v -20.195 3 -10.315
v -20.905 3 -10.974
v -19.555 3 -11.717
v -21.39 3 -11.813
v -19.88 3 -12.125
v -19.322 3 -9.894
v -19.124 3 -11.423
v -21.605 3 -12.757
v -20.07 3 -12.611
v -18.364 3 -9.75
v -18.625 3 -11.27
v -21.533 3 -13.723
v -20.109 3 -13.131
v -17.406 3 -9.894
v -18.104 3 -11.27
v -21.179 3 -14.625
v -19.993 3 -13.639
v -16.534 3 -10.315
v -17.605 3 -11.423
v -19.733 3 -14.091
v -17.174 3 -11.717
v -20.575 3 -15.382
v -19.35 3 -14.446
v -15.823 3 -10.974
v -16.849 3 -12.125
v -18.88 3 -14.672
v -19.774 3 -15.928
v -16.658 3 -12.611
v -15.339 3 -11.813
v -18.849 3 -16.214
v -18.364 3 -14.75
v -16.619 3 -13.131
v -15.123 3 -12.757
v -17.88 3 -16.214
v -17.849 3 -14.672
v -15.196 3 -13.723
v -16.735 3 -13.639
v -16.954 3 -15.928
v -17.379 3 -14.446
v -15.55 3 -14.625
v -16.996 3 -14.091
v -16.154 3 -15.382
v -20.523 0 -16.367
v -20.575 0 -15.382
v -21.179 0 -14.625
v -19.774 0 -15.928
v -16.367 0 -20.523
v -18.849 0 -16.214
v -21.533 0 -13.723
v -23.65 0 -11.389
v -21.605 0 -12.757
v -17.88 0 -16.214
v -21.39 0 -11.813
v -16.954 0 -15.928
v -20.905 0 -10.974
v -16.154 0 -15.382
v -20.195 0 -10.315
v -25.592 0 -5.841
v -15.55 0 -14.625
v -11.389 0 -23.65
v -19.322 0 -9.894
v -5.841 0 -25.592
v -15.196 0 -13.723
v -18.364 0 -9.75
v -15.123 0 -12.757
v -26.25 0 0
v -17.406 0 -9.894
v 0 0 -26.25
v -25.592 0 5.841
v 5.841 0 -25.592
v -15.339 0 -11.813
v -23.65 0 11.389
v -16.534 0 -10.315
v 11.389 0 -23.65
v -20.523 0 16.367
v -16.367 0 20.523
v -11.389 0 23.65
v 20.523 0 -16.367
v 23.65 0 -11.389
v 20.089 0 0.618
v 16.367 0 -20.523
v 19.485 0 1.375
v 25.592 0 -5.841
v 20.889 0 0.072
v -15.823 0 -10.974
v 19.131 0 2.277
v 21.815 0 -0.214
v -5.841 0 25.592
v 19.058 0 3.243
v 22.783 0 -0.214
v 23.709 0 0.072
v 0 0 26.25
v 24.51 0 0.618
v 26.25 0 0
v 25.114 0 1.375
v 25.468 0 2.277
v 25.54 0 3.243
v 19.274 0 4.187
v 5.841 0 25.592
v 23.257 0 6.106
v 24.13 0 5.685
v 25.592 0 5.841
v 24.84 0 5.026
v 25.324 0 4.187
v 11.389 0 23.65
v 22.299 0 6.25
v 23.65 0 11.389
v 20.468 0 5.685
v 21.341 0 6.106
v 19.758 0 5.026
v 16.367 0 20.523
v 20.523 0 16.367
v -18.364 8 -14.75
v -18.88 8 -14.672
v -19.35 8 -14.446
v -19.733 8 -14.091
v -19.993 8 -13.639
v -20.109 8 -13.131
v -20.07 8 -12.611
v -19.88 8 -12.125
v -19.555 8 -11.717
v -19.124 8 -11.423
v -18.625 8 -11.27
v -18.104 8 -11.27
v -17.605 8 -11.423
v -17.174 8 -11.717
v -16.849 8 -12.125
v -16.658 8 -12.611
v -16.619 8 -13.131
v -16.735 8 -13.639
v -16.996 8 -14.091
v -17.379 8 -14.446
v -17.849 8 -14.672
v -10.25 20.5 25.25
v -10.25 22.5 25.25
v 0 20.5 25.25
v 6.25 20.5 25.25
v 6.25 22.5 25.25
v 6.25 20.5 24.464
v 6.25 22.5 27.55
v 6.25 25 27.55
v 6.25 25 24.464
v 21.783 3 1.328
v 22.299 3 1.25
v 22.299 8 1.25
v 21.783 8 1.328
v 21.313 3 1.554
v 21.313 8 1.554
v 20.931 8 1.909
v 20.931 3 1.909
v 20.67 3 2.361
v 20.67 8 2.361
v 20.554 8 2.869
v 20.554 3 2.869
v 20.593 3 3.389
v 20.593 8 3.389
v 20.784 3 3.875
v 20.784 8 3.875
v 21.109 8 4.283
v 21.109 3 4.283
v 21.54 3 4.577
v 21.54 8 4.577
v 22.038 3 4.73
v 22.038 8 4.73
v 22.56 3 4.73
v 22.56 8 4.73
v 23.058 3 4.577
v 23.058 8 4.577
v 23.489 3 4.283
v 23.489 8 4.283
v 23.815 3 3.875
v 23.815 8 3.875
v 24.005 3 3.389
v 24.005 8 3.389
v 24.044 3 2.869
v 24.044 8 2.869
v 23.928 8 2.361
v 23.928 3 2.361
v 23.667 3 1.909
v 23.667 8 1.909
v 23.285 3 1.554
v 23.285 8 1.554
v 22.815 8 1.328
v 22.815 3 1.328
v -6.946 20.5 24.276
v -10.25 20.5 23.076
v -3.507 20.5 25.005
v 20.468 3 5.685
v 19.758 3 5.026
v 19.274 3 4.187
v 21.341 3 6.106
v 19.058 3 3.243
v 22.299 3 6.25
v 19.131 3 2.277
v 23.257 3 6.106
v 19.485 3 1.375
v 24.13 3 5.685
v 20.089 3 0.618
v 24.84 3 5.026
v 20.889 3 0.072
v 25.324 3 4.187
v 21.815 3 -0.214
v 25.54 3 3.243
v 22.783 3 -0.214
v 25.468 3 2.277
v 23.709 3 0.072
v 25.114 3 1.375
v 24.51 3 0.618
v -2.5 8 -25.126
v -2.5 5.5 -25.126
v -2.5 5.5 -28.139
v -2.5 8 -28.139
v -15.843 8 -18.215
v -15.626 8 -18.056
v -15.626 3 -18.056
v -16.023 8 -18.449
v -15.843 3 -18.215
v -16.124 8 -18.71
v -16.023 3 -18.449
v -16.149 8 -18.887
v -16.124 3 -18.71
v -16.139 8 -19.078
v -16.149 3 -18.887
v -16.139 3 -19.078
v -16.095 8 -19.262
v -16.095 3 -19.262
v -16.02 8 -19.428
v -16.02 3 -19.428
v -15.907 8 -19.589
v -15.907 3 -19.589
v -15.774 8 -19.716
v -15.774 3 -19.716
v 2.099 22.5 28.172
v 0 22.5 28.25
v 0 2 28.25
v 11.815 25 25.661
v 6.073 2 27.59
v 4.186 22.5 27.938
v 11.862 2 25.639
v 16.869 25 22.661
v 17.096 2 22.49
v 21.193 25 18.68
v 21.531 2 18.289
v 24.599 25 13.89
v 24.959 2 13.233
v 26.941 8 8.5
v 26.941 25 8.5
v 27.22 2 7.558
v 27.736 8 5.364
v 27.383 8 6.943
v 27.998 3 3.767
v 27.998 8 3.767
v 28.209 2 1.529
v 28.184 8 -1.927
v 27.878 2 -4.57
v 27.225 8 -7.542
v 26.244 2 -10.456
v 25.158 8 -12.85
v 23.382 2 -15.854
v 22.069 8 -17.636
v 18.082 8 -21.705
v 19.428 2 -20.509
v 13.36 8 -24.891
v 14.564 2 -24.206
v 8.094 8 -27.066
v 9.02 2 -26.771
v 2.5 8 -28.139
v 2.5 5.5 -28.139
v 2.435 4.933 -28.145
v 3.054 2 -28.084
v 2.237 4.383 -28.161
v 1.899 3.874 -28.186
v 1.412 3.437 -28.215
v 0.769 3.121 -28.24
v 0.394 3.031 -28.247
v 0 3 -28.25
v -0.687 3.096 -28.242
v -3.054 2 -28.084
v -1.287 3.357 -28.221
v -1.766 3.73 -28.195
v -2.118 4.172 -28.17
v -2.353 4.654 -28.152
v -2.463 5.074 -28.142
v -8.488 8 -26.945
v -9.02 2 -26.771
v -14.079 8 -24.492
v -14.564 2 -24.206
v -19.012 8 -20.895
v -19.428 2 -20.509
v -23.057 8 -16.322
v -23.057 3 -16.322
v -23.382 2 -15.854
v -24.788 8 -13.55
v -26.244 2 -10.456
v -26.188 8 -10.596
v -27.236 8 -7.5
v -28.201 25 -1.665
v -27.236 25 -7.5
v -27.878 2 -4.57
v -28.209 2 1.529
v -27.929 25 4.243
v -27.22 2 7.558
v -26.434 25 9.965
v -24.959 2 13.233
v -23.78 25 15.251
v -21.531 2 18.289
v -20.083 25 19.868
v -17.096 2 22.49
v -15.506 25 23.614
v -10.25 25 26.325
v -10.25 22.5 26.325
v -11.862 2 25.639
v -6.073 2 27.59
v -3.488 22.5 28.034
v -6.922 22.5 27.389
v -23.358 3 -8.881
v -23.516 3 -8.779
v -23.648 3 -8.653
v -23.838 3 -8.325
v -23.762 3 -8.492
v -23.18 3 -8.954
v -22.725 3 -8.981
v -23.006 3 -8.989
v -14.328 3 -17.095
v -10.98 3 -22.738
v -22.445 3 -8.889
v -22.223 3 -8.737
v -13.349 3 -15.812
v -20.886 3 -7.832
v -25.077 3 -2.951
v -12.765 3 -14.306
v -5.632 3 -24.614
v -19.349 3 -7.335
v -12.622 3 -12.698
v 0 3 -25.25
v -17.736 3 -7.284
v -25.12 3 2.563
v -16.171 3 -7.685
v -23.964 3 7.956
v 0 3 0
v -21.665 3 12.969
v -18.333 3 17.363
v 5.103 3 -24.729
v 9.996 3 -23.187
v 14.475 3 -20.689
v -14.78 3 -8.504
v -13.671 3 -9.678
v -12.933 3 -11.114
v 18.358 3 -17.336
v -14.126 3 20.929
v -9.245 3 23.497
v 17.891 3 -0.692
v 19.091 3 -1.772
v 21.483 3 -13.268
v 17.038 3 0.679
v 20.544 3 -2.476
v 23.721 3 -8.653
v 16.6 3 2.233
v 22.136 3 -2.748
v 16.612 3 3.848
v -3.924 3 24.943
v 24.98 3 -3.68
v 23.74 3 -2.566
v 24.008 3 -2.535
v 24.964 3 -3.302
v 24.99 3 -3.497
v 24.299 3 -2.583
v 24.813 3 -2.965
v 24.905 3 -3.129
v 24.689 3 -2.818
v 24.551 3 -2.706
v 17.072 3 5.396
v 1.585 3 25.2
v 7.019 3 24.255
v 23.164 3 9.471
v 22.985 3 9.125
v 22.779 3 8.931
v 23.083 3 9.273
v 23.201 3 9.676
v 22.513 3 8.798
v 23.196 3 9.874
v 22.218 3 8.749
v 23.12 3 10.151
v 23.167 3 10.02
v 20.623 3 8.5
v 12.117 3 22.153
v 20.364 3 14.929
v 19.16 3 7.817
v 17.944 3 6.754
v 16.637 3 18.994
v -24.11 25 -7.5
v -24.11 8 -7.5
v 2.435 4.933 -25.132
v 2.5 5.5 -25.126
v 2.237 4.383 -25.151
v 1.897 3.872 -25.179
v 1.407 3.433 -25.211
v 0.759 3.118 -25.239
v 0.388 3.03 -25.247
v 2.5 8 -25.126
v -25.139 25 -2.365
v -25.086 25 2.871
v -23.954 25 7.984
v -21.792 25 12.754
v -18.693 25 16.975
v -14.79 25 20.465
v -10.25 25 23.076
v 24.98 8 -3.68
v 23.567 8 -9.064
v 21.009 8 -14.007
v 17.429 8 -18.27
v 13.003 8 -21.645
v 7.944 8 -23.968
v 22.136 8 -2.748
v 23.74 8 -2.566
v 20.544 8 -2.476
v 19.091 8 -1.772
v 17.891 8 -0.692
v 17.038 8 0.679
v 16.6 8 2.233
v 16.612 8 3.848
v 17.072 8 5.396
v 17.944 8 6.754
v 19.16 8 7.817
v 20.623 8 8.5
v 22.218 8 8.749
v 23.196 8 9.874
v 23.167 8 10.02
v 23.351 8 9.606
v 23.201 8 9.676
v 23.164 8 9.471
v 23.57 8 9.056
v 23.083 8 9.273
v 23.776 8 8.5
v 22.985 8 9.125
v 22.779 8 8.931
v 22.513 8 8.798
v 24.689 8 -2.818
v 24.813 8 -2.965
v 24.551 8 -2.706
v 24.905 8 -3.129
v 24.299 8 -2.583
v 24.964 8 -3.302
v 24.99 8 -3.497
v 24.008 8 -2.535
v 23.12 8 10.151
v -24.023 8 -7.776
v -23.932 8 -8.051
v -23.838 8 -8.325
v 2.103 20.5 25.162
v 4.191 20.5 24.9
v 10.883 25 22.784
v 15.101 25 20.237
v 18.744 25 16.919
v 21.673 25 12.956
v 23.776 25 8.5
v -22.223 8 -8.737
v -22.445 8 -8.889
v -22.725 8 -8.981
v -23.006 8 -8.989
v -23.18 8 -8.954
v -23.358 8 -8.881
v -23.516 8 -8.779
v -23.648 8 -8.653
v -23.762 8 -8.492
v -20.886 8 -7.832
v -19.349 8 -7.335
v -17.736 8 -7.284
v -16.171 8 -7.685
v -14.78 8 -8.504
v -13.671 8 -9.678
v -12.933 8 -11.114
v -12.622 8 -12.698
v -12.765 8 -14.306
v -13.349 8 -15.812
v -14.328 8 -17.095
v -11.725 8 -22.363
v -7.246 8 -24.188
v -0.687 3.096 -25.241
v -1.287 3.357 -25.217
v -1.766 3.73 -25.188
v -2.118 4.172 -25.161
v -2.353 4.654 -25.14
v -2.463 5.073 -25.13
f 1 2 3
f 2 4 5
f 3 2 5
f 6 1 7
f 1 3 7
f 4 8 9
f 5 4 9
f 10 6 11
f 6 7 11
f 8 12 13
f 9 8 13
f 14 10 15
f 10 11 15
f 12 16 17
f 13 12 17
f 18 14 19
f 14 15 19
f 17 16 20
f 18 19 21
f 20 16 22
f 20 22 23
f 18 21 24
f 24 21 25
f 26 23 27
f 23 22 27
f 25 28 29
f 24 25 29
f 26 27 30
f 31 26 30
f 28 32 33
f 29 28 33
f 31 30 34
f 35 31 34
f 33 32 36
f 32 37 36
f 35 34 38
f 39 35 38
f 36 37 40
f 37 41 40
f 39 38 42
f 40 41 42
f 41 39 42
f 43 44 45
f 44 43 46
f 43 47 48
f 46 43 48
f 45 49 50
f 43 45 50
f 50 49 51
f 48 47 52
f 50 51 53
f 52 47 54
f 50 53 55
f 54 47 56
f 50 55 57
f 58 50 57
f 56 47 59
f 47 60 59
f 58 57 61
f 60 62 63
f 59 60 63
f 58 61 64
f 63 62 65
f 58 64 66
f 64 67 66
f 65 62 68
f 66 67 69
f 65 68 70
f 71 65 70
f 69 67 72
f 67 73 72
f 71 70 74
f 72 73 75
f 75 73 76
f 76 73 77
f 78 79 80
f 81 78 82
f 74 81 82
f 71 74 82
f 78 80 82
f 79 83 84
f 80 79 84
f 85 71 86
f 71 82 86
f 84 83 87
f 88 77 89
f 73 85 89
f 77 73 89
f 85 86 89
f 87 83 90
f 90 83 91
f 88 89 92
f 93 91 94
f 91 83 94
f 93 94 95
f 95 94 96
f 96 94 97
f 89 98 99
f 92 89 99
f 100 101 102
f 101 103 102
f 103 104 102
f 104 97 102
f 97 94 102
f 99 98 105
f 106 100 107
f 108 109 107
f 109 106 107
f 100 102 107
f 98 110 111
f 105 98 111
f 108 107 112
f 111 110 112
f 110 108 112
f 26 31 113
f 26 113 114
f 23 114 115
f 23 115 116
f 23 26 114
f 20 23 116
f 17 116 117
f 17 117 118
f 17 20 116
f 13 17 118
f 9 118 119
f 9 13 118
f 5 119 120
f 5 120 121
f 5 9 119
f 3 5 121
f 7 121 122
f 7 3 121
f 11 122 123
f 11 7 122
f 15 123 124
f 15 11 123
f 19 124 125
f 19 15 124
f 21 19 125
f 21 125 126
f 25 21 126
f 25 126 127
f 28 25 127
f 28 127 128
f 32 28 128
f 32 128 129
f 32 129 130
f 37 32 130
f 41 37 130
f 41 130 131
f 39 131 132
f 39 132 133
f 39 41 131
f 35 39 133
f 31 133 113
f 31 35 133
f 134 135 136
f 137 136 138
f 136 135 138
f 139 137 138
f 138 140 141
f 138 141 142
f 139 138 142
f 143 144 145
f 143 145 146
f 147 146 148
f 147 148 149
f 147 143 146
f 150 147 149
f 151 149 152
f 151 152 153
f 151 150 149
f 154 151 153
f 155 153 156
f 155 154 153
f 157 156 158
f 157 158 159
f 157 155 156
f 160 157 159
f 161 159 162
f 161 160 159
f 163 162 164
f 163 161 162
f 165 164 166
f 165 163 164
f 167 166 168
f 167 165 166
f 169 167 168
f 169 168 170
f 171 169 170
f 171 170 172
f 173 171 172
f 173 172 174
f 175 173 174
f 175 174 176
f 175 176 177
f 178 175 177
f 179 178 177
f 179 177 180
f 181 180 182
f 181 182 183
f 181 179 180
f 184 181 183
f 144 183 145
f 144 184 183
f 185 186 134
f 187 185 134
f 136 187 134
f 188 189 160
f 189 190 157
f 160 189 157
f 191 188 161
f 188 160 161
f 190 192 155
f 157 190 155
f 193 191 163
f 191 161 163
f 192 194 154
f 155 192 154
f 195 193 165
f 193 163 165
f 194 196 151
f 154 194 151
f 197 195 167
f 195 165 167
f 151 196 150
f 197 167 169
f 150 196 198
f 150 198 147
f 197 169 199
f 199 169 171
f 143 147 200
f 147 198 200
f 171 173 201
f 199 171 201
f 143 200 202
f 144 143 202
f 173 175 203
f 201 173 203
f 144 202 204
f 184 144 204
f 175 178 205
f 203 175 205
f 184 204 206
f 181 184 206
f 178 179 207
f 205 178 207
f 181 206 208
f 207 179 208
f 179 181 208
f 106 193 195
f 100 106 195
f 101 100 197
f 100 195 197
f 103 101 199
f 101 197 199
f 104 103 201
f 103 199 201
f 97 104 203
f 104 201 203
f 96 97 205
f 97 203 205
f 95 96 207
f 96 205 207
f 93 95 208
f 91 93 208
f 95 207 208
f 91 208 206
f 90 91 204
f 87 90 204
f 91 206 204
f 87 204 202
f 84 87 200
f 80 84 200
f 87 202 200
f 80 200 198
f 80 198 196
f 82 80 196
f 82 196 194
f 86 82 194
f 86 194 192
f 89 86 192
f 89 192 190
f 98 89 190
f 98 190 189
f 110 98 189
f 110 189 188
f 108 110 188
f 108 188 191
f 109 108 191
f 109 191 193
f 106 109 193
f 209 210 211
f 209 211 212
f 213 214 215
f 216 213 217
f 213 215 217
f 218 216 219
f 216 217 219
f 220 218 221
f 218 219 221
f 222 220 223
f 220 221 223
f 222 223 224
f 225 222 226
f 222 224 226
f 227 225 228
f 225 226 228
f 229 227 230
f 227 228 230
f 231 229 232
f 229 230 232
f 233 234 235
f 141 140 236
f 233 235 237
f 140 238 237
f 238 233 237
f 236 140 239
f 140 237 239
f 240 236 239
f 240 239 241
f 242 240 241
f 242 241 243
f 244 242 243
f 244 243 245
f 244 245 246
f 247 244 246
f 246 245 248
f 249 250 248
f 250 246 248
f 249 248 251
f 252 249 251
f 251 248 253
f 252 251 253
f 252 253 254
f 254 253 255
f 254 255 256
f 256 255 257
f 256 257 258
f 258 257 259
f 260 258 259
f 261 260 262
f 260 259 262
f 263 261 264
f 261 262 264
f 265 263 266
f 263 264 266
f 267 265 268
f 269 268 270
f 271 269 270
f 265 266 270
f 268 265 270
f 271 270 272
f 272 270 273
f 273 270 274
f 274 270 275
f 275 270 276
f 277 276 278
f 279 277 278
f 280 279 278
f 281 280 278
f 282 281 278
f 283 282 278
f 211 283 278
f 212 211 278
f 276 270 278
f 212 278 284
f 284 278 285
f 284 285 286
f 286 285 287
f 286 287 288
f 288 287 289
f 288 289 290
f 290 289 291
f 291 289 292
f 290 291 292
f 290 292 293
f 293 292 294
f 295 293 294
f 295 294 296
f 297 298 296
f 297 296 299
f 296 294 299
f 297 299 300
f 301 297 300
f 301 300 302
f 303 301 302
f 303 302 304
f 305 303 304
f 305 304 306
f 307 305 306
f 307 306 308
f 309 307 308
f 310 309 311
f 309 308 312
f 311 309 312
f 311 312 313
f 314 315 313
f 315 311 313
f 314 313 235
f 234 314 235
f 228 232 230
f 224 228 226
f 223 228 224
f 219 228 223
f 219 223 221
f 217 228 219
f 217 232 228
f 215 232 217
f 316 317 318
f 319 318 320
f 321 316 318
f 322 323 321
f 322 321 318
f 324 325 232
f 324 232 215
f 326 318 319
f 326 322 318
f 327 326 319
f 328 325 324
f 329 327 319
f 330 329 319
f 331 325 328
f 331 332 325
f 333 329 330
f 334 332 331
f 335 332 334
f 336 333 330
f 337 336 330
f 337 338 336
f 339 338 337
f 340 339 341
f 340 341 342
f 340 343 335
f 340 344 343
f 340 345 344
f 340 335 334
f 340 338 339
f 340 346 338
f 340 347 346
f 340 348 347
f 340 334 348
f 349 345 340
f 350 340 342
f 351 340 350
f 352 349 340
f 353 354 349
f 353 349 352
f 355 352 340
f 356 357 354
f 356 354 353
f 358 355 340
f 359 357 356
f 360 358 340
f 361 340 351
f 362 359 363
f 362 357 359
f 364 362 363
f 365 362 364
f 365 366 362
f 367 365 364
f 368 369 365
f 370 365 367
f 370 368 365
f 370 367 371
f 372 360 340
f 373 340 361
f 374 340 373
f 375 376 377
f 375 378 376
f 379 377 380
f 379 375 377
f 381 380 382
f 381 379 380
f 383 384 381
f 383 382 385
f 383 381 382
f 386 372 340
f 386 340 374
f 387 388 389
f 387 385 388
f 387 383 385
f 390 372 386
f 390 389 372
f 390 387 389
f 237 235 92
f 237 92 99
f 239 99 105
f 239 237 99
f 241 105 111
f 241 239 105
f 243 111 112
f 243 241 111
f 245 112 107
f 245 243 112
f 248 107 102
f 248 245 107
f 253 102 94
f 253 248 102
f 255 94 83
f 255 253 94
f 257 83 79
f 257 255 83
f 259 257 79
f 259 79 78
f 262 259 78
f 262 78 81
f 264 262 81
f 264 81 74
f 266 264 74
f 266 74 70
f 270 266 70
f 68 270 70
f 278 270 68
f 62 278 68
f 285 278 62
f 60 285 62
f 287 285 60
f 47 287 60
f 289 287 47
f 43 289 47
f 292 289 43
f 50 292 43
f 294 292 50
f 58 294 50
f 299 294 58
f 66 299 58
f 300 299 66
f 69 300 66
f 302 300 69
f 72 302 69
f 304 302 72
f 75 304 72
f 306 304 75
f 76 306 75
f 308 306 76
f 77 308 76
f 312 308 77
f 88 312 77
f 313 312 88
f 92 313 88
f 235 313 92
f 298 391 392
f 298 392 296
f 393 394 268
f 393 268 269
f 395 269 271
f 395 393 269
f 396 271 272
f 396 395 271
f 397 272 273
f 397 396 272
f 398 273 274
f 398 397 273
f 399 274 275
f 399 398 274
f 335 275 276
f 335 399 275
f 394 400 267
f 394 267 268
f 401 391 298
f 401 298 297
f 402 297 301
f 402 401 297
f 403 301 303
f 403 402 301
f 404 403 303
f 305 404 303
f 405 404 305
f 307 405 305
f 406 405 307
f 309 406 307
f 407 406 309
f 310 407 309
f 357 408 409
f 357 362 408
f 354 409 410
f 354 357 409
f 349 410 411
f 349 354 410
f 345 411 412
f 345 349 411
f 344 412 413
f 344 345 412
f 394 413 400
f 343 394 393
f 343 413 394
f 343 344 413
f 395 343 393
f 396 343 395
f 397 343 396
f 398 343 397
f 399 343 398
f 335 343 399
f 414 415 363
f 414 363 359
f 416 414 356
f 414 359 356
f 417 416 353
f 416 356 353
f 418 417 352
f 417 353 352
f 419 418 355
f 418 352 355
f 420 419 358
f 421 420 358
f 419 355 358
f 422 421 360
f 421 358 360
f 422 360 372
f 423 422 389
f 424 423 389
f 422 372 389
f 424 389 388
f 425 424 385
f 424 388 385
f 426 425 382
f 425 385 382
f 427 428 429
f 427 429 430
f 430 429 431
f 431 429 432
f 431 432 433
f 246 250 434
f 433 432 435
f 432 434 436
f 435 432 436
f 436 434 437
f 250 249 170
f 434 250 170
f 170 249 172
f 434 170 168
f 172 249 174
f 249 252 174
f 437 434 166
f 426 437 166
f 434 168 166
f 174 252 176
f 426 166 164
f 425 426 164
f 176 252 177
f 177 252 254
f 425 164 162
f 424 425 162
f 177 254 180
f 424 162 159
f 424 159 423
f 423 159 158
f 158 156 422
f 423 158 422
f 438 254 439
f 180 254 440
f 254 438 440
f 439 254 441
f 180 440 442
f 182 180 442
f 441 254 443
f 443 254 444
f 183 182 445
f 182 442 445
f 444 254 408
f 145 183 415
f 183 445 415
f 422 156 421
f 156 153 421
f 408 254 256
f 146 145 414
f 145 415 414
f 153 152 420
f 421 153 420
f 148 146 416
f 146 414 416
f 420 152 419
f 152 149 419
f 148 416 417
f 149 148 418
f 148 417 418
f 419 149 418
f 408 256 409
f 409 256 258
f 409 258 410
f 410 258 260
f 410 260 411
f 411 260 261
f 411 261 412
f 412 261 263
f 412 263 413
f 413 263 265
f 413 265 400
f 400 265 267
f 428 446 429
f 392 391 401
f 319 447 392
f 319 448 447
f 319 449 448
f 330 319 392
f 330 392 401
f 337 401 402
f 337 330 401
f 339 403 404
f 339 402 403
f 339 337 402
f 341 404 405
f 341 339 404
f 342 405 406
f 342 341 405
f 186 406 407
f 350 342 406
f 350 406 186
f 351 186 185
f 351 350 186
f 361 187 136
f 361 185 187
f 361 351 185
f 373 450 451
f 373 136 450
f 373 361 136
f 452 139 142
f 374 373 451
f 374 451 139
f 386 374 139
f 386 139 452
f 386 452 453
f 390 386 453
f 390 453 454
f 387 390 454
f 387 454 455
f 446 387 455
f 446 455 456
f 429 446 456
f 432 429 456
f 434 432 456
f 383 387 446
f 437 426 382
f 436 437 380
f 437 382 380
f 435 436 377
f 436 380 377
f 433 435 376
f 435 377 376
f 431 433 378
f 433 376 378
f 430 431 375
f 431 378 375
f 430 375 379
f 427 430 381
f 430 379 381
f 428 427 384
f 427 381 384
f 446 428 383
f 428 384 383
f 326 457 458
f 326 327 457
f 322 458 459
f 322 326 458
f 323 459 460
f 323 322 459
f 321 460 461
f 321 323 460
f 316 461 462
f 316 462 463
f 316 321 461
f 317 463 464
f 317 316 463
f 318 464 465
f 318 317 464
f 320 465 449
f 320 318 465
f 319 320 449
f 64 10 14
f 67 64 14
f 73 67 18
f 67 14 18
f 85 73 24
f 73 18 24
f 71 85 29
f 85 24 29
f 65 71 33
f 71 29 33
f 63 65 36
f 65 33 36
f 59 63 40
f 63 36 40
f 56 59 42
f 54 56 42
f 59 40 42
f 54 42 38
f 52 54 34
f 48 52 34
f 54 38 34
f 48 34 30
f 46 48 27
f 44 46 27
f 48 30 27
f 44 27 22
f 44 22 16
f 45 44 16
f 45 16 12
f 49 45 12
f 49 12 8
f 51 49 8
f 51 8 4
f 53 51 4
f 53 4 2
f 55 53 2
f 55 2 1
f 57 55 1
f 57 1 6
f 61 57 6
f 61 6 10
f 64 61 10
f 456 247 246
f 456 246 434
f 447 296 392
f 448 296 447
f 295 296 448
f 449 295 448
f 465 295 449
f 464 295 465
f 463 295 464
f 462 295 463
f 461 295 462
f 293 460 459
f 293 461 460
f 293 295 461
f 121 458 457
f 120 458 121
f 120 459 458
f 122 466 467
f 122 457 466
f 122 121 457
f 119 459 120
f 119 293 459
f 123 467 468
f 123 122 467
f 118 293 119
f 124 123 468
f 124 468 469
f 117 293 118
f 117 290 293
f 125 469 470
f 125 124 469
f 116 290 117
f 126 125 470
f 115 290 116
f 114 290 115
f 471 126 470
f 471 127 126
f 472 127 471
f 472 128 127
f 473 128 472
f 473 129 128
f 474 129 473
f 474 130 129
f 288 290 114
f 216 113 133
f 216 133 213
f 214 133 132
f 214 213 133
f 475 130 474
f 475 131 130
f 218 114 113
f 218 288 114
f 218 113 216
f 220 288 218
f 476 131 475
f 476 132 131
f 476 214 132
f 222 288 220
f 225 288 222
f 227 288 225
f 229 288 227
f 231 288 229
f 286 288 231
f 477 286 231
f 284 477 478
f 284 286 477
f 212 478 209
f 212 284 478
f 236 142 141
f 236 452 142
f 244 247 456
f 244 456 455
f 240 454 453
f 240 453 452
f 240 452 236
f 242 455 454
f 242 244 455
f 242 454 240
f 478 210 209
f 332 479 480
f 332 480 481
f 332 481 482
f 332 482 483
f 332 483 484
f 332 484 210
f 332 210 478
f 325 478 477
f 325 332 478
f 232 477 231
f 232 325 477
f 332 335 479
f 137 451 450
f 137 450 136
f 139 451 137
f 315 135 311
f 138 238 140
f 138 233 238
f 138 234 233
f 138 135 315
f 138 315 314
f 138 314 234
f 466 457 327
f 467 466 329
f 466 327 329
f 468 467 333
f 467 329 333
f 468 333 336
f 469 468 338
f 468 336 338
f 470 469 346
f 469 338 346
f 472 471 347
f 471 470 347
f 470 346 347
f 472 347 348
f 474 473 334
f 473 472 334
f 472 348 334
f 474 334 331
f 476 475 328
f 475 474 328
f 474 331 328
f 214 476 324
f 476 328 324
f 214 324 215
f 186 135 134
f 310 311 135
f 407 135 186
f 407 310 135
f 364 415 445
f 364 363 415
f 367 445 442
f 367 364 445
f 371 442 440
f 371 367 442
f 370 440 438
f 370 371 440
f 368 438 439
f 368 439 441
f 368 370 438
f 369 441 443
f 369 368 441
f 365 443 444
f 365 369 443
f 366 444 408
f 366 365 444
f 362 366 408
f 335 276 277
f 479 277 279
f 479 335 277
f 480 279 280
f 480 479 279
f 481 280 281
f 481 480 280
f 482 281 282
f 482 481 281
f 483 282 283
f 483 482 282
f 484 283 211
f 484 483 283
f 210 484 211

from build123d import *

# Parameters (mm, degrees)
SKETCH1_R           = 28.25
BOSS_EXTRUDE1_DEPTH = 25
SHELL1_T            = -3
CUT_EXTRUDE1_DEPTH  = 17
SKETCH3_W           = 16.5
SKETCH3_H           = 5.174038482
CUT_EXTRUDE2_DEPTH  = 2.5
CUT_EXTRUDE3_DEPTH  = 48.128812843
SKETCH6_R           = 3.25
CUT_EXTRUDE4_DEPTH  = 46.608387559
SKETCH7_R           = 5.75
SKETCH7_R_2         = 1.75
BOSS_EXTRUDE2_DEPTH = 5
FILLET1_R           = 1
CHAMFER1_SIZE       = 2
SKETCH8_W           = 16.5
SKETCH8_H           = 2.174038482
CUT_EXTRUDE5_DEPTH  = 2


with BuildPart() as part:
    # Sketch1 → Boss-Extrude1 (new body)
    with BuildSketch(Plane(origin=(0, 0, 0), x_dir=(1, 0, 0), z_dir=(0, 1, 0))):
        with Locations(Location((0, 0, 0), (0, 0, 270))):
            Circle(SKETCH1_R)
    extrude(amount=BOSS_EXTRUDE1_DEPTH)

    # Shell1
    shell1_openings = [part.faces().sort_by_distance(p)[0] for p in [
        (0, 25, 0),
    ]]
    offset(amount=SHELL1_T, openings=shell1_openings, kind=Kind.INTERSECTION)

    # Sketch2 → Cut-Extrude1 (cut)
    with BuildSketch(Plane(origin=(0, 25, 0), x_dir=(1, 0, 0), z_dir=(0, 1, 0))):
        Polygon((0, 7.5), (-28.25, 7.5), (-28.25, 28.25), (28.25, 28.25), (28.25, -8.5), (0, -8.5), align=None)
    extrude(amount=-CUT_EXTRUDE1_DEPTH, mode=Mode.SUBTRACT)

    # Sketch3 → Cut-Extrude2 (cut)
    with BuildSketch(Plane(origin=(0, 25, 0), x_dir=(1, 0, 0), z_dir=(0, 1, 0))):
        with Locations((-2, -25.662980759)):
            Rectangle(SKETCH3_W, SKETCH3_H)
    extrude(amount=-CUT_EXTRUDE2_DEPTH, mode=Mode.SUBTRACT)

    # Sketch5 → Cut-Extrude3 (cut, through all)
    with BuildSketch(Plane.XY):
        with BuildLine():
            Line((2.5, 8), (2.5, 5.5))
            ThreePointArc((2.5, 5.5), (1.767766953, 3.732233047), (0, 3))
            ThreePointArc((0, 3), (-1.767766953, 3.732233047), (-2.5, 5.5))
            Line((-2.5, 5.5), (-2.5, 8))
            Line((-2.5, 8), (2.5, 8))
        make_face()
    extrude(amount=-CUT_EXTRUDE3_DEPTH, mode=Mode.SUBTRACT)

    # Sketch6 → Cut-Extrude4 (cut, through all)
    with BuildSketch(Plane(origin=(0, 3, 0), x_dir=(1, 0, 0), z_dir=(0, 1, 0))):
        with Locations(Location((-18.364367672, 13, 0), (0, 0, 270))):
            Circle(SKETCH6_R)
        with Locations(Location((22.299103121, -3, 0), (0, 0, 270))):
            Circle(SKETCH6_R)
    extrude(amount=-CUT_EXTRUDE4_DEPTH, mode=Mode.SUBTRACT)

    # Sketch7 → Boss-Extrude2 (add)
    # profile 1 of 2: a face of its own
    with BuildSketch(Plane(origin=(0, 3, 0), x_dir=(1, 0, 0), z_dir=(0, 1, 0))):
        with Locations((-18.364367672, 13)):
            Circle(SKETCH7_R)
        with Locations(Location((-18.364367672, 13, 0), (0, 0, 90))):
            Circle(SKETCH7_R_2, mode=Mode.SUBTRACT)
    # profile 2 of 2: a face of its own
    with BuildSketch(Plane(origin=(0, 3, 0), x_dir=(1, 0, 0), z_dir=(0, 1, 0))):
        with Locations((22.299103121, -3)):
            Circle(SKETCH7_R)
        with Locations(Location((22.299103121, -3, 0), (0, 0, 90))):
            Circle(SKETCH7_R_2, mode=Mode.SUBTRACT)
    extrude(amount=BOSS_EXTRUDE2_DEPTH)

    # Fillet1
    fillet1_edges = [part.edges().sort_by_distance(p)[0] for p in [
        (-23.219797584, 5.5, -9.919853839),
        (-17.072985413, 5.5, -18.603109124),
        (23.753694458, 5.5, 8.56297259),
        (25.172189575, 5.5, -1.980750368),
    ]]
    fillet(fillet1_edges, radius=FILLET1_R)

    # Chamfer1
    chamfer1_edges = [part.edges().sort_by_distance(p)[0] for p in [
        (0, 0, -28.25),
    ]]
    chamfer(chamfer1_edges, length=CHAMFER1_SIZE)

    # Sketch8 → Cut-Extrude5 (cut)
    with BuildSketch(Plane(origin=(0, 22.5, 0), x_dir=(1, 0, 0), z_dir=(0, 1, 0))):
        with Locations((-2, -24.162980759)):
            Rectangle(SKETCH8_W, SKETCH8_H)
    extrude(amount=-CUT_EXTRUDE5_DEPTH, mode=Mode.SUBTRACT)


solid = part.part
